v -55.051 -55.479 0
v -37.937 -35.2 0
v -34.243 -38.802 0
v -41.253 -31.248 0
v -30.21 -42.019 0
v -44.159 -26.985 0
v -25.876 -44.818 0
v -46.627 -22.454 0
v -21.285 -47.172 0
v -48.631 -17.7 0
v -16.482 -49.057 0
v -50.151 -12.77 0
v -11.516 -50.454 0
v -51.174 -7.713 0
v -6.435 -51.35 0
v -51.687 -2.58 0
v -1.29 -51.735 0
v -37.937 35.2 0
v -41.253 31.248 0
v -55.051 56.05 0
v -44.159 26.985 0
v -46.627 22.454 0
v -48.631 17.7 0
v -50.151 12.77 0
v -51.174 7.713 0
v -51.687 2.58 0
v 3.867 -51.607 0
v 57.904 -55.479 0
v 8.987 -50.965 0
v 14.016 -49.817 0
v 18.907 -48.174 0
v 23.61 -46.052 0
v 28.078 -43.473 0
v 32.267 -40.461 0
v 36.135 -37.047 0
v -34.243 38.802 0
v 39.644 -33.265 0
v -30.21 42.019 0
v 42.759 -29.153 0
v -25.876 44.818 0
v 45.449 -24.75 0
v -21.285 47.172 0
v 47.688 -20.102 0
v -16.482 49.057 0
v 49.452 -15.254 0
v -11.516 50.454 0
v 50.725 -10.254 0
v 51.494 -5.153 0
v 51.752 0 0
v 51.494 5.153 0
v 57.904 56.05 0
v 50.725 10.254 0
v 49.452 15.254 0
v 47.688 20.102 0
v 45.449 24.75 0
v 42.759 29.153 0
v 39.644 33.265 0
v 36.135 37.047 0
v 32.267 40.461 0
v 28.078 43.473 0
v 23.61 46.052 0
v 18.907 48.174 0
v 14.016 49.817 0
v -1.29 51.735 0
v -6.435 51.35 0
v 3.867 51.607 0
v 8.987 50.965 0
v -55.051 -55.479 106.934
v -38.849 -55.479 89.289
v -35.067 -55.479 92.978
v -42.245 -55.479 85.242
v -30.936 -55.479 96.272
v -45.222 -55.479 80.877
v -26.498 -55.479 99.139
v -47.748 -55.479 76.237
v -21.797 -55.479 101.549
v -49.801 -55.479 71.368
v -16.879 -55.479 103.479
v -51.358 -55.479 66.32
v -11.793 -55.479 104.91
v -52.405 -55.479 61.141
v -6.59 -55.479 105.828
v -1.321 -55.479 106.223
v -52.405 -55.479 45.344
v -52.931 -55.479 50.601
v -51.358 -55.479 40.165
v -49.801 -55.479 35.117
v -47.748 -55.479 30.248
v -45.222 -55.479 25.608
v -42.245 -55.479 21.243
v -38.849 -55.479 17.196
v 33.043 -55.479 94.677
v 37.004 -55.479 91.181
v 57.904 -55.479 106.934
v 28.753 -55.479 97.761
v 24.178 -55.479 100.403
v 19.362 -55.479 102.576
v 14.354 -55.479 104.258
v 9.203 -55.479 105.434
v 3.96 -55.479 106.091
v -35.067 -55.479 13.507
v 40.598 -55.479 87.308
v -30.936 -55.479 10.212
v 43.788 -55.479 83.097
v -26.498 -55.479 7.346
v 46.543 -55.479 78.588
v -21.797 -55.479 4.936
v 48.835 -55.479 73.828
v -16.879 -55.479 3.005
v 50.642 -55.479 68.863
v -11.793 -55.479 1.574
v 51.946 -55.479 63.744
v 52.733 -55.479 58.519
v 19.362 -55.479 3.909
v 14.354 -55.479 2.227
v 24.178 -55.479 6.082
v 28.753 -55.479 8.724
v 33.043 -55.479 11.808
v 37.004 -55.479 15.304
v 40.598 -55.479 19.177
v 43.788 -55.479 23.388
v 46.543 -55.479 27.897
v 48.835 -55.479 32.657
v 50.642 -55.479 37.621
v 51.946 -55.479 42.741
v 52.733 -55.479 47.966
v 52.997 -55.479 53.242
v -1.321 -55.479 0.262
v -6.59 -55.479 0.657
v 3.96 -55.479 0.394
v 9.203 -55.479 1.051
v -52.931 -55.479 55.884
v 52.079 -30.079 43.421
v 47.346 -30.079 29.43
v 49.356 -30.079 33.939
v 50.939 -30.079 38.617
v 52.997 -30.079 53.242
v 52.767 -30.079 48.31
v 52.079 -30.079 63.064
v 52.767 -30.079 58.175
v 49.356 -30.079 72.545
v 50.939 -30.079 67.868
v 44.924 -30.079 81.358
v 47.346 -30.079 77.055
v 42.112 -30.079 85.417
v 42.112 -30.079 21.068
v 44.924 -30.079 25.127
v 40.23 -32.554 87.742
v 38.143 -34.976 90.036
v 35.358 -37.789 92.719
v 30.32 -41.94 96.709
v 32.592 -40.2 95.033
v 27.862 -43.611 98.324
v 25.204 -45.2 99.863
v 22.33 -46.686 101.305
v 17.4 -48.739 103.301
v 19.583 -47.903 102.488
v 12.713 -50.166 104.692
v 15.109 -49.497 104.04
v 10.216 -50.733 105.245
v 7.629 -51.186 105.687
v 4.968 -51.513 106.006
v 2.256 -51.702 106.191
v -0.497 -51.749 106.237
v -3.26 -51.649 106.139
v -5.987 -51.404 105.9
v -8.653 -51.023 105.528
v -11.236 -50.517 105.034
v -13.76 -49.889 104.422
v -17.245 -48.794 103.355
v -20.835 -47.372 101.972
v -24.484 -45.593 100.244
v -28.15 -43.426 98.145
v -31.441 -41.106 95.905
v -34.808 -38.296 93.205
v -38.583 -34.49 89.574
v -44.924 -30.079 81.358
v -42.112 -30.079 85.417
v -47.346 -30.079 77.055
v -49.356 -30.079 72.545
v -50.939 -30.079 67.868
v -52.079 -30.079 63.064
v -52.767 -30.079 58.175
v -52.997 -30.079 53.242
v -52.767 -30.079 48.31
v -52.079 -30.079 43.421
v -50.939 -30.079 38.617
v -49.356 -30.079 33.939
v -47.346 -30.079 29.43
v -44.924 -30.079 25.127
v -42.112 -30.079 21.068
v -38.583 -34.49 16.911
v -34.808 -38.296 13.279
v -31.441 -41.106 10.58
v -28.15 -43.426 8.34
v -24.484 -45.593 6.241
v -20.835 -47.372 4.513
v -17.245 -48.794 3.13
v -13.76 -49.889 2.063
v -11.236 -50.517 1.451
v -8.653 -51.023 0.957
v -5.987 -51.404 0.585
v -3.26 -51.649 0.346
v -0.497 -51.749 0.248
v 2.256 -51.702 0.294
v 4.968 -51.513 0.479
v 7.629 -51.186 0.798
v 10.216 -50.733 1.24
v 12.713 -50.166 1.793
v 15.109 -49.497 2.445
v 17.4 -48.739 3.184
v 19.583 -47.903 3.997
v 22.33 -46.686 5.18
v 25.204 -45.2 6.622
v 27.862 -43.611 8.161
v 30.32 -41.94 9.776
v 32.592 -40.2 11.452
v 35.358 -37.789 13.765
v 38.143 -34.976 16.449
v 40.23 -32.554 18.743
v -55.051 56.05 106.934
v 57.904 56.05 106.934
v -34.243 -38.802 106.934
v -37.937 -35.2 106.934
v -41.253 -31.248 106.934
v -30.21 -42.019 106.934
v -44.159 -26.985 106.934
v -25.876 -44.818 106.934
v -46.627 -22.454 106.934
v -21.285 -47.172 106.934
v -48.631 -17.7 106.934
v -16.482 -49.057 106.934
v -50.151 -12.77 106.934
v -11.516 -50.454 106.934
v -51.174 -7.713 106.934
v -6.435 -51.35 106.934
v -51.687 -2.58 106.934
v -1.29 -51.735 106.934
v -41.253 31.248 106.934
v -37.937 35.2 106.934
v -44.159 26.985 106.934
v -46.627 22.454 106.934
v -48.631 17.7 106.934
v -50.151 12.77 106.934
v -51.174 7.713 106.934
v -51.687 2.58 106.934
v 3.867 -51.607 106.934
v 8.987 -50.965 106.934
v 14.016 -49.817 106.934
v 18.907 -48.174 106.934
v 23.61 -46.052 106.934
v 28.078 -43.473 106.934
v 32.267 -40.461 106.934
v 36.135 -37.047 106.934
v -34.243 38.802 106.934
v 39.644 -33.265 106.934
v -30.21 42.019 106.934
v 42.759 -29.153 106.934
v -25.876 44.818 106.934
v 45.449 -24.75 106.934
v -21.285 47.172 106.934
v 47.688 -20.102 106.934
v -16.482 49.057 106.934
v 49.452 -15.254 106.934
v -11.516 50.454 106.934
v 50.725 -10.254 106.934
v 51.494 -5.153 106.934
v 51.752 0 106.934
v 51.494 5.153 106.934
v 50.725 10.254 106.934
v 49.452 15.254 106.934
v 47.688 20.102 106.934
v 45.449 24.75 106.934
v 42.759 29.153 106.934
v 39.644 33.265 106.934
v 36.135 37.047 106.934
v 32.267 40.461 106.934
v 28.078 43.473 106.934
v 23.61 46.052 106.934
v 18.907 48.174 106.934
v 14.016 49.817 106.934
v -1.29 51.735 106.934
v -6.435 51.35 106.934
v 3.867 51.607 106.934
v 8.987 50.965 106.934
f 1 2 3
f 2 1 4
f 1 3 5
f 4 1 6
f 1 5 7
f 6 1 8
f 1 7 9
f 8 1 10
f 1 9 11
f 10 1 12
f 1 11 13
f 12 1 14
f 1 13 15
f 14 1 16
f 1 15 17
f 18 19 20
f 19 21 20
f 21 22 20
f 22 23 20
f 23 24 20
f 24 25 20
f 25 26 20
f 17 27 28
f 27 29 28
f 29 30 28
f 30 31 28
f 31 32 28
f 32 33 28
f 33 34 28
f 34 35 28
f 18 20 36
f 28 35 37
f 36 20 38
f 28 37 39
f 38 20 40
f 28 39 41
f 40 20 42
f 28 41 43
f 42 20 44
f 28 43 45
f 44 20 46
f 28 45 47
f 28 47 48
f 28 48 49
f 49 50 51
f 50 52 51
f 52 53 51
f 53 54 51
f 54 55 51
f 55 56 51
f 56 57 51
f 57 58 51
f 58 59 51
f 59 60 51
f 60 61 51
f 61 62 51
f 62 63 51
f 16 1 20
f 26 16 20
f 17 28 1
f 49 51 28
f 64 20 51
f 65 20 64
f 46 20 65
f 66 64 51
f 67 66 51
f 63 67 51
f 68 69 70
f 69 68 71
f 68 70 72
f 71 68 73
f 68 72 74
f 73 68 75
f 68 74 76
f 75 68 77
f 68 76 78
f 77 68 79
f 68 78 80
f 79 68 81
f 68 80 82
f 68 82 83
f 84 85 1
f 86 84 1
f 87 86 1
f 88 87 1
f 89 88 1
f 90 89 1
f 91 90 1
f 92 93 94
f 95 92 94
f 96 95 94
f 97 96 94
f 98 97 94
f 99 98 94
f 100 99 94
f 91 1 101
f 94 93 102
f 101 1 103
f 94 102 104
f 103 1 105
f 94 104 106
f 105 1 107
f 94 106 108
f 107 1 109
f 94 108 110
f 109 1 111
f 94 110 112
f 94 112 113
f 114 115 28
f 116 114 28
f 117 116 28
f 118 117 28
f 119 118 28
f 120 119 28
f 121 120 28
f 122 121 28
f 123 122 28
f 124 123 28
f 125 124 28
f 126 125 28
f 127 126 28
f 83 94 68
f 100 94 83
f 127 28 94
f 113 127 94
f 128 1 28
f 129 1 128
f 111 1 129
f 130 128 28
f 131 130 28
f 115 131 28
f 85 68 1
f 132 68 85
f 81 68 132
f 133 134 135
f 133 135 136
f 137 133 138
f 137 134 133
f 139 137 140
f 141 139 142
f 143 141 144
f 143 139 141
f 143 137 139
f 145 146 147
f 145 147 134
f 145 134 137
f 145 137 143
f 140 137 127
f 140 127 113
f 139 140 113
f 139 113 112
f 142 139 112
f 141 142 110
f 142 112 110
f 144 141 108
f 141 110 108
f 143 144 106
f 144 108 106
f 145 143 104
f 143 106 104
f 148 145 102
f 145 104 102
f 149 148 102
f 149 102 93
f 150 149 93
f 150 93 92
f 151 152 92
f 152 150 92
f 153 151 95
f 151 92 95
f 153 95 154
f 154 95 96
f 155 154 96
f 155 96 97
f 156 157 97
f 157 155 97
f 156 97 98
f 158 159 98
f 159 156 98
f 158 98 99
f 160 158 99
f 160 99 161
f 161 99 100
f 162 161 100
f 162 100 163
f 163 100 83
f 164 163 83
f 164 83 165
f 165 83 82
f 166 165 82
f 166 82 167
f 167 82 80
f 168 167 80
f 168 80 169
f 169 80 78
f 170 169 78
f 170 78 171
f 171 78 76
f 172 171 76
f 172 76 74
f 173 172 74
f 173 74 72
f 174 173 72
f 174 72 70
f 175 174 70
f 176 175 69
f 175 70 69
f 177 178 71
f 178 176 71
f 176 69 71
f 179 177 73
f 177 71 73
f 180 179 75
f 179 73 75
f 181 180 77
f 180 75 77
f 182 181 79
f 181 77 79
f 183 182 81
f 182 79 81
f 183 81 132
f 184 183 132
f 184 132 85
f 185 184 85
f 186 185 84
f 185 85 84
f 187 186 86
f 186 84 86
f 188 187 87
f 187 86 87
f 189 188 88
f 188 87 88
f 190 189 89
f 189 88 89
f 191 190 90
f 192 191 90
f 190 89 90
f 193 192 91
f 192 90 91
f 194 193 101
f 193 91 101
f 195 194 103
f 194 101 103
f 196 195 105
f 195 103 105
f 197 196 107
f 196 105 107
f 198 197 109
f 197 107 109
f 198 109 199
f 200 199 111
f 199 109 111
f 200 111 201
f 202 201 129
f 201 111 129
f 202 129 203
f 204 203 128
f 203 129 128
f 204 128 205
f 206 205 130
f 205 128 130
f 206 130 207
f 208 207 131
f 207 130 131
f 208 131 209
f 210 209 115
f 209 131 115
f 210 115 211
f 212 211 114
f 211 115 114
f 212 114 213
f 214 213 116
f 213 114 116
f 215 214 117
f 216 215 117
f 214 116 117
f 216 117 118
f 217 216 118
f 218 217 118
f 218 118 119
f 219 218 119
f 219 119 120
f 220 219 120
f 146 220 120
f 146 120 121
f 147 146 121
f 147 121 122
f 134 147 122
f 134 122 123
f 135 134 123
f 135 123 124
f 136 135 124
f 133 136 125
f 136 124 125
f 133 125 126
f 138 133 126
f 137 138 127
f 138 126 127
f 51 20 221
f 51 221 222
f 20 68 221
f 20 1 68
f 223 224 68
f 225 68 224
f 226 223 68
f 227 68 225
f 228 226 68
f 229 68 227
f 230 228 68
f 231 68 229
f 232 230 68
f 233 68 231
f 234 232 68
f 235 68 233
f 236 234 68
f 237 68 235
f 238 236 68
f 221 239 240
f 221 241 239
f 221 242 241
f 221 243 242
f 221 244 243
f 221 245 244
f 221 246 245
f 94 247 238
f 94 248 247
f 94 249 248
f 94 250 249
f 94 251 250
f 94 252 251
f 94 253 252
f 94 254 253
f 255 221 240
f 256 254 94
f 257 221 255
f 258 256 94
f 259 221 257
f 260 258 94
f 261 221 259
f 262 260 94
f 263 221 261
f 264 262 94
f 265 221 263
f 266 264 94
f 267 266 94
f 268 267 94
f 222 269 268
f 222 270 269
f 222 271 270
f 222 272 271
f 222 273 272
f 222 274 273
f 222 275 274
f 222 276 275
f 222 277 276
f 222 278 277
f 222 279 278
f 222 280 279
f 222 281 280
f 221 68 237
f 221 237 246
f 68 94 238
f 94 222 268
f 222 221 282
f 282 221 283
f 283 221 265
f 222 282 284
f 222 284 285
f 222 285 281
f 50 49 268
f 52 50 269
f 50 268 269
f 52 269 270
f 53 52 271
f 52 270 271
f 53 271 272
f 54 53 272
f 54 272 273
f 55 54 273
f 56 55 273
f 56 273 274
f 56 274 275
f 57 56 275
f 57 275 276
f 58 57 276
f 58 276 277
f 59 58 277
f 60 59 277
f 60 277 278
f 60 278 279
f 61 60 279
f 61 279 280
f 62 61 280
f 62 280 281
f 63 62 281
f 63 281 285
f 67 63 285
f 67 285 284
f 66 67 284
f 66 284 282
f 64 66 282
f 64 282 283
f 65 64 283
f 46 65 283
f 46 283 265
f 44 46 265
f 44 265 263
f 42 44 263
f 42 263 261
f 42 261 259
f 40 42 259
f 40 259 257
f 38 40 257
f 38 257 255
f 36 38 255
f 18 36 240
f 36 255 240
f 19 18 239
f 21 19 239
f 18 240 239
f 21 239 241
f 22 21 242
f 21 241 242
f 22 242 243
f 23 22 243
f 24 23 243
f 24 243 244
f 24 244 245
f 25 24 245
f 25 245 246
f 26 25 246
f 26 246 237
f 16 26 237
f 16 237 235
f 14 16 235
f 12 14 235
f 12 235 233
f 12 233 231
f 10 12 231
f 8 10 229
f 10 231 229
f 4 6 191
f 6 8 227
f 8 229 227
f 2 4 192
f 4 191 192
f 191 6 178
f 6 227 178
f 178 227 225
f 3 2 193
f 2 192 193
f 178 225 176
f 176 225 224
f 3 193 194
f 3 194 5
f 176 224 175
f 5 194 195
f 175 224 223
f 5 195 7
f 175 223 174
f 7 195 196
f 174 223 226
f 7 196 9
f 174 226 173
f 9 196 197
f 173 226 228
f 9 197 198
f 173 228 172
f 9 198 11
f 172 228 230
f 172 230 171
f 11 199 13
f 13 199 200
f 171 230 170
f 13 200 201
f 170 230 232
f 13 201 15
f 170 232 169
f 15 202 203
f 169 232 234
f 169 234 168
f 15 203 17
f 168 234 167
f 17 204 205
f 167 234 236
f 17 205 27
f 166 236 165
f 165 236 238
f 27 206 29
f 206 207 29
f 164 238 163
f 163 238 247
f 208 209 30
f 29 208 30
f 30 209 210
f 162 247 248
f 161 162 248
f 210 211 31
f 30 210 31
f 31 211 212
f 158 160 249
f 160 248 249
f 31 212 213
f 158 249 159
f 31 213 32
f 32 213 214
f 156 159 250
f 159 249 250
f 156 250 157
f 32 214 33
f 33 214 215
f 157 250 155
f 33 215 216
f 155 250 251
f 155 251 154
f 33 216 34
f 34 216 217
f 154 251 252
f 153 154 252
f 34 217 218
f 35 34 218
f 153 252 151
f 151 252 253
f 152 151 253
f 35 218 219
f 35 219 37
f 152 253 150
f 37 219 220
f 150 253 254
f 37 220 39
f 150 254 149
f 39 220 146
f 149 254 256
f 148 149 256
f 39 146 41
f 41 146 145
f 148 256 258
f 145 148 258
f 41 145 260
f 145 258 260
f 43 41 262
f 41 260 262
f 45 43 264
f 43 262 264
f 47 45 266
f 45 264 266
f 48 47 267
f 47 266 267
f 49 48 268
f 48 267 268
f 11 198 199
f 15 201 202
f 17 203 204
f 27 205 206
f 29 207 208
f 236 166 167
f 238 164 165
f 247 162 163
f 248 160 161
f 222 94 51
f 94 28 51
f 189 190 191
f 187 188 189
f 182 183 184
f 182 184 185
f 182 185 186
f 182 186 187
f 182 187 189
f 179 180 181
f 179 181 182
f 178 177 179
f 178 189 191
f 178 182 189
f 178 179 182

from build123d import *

# Parameters (mm, degrees)
F0_W     = 112.955294
F0_H     = 111.52909
F1_DEPTH = 93.472
F2_W     = 112.955294
F2_H     = 111.52909
F3_DEPTH = 13.462
F4_R     = 51.751528
F5_DEPTH = 131.318
F6_R     = 52.996706
F7_DEPTH = 25.4


with BuildPart() as f1:
    # F0 (on Top) → F1 (new body)
    with BuildSketch(Plane.XY):
        with Locations((1.426205, 0.285242)):
            Rectangle(F0_W, F0_H)
    extrude(amount=F1_DEPTH)

    # F2 (on face) → F3 (join)
    with BuildSketch(Plane.XY.offset(93.472)):
        with Locations((1.426205, 0.285242)):
            Rectangle(F2_W, F2_H)
    extrude(amount=F3_DEPTH)

    # F4 (on face) → F5 (cut)
    with BuildSketch(Plane.XY.offset(106.934)):
        Circle(F4_R)
    extrude(amount=-F5_DEPTH, mode=Mode.SUBTRACT)

    # F6 (on face) → F7 (cut)
    with BuildSketch(Plane.XZ.offset(55.479303)):
        with Locations((0, 53.242445)):
            Circle(F6_R)
    extrude(amount=-F7_DEPTH, mode=Mode.SUBTRACT)


solid = f1.part
